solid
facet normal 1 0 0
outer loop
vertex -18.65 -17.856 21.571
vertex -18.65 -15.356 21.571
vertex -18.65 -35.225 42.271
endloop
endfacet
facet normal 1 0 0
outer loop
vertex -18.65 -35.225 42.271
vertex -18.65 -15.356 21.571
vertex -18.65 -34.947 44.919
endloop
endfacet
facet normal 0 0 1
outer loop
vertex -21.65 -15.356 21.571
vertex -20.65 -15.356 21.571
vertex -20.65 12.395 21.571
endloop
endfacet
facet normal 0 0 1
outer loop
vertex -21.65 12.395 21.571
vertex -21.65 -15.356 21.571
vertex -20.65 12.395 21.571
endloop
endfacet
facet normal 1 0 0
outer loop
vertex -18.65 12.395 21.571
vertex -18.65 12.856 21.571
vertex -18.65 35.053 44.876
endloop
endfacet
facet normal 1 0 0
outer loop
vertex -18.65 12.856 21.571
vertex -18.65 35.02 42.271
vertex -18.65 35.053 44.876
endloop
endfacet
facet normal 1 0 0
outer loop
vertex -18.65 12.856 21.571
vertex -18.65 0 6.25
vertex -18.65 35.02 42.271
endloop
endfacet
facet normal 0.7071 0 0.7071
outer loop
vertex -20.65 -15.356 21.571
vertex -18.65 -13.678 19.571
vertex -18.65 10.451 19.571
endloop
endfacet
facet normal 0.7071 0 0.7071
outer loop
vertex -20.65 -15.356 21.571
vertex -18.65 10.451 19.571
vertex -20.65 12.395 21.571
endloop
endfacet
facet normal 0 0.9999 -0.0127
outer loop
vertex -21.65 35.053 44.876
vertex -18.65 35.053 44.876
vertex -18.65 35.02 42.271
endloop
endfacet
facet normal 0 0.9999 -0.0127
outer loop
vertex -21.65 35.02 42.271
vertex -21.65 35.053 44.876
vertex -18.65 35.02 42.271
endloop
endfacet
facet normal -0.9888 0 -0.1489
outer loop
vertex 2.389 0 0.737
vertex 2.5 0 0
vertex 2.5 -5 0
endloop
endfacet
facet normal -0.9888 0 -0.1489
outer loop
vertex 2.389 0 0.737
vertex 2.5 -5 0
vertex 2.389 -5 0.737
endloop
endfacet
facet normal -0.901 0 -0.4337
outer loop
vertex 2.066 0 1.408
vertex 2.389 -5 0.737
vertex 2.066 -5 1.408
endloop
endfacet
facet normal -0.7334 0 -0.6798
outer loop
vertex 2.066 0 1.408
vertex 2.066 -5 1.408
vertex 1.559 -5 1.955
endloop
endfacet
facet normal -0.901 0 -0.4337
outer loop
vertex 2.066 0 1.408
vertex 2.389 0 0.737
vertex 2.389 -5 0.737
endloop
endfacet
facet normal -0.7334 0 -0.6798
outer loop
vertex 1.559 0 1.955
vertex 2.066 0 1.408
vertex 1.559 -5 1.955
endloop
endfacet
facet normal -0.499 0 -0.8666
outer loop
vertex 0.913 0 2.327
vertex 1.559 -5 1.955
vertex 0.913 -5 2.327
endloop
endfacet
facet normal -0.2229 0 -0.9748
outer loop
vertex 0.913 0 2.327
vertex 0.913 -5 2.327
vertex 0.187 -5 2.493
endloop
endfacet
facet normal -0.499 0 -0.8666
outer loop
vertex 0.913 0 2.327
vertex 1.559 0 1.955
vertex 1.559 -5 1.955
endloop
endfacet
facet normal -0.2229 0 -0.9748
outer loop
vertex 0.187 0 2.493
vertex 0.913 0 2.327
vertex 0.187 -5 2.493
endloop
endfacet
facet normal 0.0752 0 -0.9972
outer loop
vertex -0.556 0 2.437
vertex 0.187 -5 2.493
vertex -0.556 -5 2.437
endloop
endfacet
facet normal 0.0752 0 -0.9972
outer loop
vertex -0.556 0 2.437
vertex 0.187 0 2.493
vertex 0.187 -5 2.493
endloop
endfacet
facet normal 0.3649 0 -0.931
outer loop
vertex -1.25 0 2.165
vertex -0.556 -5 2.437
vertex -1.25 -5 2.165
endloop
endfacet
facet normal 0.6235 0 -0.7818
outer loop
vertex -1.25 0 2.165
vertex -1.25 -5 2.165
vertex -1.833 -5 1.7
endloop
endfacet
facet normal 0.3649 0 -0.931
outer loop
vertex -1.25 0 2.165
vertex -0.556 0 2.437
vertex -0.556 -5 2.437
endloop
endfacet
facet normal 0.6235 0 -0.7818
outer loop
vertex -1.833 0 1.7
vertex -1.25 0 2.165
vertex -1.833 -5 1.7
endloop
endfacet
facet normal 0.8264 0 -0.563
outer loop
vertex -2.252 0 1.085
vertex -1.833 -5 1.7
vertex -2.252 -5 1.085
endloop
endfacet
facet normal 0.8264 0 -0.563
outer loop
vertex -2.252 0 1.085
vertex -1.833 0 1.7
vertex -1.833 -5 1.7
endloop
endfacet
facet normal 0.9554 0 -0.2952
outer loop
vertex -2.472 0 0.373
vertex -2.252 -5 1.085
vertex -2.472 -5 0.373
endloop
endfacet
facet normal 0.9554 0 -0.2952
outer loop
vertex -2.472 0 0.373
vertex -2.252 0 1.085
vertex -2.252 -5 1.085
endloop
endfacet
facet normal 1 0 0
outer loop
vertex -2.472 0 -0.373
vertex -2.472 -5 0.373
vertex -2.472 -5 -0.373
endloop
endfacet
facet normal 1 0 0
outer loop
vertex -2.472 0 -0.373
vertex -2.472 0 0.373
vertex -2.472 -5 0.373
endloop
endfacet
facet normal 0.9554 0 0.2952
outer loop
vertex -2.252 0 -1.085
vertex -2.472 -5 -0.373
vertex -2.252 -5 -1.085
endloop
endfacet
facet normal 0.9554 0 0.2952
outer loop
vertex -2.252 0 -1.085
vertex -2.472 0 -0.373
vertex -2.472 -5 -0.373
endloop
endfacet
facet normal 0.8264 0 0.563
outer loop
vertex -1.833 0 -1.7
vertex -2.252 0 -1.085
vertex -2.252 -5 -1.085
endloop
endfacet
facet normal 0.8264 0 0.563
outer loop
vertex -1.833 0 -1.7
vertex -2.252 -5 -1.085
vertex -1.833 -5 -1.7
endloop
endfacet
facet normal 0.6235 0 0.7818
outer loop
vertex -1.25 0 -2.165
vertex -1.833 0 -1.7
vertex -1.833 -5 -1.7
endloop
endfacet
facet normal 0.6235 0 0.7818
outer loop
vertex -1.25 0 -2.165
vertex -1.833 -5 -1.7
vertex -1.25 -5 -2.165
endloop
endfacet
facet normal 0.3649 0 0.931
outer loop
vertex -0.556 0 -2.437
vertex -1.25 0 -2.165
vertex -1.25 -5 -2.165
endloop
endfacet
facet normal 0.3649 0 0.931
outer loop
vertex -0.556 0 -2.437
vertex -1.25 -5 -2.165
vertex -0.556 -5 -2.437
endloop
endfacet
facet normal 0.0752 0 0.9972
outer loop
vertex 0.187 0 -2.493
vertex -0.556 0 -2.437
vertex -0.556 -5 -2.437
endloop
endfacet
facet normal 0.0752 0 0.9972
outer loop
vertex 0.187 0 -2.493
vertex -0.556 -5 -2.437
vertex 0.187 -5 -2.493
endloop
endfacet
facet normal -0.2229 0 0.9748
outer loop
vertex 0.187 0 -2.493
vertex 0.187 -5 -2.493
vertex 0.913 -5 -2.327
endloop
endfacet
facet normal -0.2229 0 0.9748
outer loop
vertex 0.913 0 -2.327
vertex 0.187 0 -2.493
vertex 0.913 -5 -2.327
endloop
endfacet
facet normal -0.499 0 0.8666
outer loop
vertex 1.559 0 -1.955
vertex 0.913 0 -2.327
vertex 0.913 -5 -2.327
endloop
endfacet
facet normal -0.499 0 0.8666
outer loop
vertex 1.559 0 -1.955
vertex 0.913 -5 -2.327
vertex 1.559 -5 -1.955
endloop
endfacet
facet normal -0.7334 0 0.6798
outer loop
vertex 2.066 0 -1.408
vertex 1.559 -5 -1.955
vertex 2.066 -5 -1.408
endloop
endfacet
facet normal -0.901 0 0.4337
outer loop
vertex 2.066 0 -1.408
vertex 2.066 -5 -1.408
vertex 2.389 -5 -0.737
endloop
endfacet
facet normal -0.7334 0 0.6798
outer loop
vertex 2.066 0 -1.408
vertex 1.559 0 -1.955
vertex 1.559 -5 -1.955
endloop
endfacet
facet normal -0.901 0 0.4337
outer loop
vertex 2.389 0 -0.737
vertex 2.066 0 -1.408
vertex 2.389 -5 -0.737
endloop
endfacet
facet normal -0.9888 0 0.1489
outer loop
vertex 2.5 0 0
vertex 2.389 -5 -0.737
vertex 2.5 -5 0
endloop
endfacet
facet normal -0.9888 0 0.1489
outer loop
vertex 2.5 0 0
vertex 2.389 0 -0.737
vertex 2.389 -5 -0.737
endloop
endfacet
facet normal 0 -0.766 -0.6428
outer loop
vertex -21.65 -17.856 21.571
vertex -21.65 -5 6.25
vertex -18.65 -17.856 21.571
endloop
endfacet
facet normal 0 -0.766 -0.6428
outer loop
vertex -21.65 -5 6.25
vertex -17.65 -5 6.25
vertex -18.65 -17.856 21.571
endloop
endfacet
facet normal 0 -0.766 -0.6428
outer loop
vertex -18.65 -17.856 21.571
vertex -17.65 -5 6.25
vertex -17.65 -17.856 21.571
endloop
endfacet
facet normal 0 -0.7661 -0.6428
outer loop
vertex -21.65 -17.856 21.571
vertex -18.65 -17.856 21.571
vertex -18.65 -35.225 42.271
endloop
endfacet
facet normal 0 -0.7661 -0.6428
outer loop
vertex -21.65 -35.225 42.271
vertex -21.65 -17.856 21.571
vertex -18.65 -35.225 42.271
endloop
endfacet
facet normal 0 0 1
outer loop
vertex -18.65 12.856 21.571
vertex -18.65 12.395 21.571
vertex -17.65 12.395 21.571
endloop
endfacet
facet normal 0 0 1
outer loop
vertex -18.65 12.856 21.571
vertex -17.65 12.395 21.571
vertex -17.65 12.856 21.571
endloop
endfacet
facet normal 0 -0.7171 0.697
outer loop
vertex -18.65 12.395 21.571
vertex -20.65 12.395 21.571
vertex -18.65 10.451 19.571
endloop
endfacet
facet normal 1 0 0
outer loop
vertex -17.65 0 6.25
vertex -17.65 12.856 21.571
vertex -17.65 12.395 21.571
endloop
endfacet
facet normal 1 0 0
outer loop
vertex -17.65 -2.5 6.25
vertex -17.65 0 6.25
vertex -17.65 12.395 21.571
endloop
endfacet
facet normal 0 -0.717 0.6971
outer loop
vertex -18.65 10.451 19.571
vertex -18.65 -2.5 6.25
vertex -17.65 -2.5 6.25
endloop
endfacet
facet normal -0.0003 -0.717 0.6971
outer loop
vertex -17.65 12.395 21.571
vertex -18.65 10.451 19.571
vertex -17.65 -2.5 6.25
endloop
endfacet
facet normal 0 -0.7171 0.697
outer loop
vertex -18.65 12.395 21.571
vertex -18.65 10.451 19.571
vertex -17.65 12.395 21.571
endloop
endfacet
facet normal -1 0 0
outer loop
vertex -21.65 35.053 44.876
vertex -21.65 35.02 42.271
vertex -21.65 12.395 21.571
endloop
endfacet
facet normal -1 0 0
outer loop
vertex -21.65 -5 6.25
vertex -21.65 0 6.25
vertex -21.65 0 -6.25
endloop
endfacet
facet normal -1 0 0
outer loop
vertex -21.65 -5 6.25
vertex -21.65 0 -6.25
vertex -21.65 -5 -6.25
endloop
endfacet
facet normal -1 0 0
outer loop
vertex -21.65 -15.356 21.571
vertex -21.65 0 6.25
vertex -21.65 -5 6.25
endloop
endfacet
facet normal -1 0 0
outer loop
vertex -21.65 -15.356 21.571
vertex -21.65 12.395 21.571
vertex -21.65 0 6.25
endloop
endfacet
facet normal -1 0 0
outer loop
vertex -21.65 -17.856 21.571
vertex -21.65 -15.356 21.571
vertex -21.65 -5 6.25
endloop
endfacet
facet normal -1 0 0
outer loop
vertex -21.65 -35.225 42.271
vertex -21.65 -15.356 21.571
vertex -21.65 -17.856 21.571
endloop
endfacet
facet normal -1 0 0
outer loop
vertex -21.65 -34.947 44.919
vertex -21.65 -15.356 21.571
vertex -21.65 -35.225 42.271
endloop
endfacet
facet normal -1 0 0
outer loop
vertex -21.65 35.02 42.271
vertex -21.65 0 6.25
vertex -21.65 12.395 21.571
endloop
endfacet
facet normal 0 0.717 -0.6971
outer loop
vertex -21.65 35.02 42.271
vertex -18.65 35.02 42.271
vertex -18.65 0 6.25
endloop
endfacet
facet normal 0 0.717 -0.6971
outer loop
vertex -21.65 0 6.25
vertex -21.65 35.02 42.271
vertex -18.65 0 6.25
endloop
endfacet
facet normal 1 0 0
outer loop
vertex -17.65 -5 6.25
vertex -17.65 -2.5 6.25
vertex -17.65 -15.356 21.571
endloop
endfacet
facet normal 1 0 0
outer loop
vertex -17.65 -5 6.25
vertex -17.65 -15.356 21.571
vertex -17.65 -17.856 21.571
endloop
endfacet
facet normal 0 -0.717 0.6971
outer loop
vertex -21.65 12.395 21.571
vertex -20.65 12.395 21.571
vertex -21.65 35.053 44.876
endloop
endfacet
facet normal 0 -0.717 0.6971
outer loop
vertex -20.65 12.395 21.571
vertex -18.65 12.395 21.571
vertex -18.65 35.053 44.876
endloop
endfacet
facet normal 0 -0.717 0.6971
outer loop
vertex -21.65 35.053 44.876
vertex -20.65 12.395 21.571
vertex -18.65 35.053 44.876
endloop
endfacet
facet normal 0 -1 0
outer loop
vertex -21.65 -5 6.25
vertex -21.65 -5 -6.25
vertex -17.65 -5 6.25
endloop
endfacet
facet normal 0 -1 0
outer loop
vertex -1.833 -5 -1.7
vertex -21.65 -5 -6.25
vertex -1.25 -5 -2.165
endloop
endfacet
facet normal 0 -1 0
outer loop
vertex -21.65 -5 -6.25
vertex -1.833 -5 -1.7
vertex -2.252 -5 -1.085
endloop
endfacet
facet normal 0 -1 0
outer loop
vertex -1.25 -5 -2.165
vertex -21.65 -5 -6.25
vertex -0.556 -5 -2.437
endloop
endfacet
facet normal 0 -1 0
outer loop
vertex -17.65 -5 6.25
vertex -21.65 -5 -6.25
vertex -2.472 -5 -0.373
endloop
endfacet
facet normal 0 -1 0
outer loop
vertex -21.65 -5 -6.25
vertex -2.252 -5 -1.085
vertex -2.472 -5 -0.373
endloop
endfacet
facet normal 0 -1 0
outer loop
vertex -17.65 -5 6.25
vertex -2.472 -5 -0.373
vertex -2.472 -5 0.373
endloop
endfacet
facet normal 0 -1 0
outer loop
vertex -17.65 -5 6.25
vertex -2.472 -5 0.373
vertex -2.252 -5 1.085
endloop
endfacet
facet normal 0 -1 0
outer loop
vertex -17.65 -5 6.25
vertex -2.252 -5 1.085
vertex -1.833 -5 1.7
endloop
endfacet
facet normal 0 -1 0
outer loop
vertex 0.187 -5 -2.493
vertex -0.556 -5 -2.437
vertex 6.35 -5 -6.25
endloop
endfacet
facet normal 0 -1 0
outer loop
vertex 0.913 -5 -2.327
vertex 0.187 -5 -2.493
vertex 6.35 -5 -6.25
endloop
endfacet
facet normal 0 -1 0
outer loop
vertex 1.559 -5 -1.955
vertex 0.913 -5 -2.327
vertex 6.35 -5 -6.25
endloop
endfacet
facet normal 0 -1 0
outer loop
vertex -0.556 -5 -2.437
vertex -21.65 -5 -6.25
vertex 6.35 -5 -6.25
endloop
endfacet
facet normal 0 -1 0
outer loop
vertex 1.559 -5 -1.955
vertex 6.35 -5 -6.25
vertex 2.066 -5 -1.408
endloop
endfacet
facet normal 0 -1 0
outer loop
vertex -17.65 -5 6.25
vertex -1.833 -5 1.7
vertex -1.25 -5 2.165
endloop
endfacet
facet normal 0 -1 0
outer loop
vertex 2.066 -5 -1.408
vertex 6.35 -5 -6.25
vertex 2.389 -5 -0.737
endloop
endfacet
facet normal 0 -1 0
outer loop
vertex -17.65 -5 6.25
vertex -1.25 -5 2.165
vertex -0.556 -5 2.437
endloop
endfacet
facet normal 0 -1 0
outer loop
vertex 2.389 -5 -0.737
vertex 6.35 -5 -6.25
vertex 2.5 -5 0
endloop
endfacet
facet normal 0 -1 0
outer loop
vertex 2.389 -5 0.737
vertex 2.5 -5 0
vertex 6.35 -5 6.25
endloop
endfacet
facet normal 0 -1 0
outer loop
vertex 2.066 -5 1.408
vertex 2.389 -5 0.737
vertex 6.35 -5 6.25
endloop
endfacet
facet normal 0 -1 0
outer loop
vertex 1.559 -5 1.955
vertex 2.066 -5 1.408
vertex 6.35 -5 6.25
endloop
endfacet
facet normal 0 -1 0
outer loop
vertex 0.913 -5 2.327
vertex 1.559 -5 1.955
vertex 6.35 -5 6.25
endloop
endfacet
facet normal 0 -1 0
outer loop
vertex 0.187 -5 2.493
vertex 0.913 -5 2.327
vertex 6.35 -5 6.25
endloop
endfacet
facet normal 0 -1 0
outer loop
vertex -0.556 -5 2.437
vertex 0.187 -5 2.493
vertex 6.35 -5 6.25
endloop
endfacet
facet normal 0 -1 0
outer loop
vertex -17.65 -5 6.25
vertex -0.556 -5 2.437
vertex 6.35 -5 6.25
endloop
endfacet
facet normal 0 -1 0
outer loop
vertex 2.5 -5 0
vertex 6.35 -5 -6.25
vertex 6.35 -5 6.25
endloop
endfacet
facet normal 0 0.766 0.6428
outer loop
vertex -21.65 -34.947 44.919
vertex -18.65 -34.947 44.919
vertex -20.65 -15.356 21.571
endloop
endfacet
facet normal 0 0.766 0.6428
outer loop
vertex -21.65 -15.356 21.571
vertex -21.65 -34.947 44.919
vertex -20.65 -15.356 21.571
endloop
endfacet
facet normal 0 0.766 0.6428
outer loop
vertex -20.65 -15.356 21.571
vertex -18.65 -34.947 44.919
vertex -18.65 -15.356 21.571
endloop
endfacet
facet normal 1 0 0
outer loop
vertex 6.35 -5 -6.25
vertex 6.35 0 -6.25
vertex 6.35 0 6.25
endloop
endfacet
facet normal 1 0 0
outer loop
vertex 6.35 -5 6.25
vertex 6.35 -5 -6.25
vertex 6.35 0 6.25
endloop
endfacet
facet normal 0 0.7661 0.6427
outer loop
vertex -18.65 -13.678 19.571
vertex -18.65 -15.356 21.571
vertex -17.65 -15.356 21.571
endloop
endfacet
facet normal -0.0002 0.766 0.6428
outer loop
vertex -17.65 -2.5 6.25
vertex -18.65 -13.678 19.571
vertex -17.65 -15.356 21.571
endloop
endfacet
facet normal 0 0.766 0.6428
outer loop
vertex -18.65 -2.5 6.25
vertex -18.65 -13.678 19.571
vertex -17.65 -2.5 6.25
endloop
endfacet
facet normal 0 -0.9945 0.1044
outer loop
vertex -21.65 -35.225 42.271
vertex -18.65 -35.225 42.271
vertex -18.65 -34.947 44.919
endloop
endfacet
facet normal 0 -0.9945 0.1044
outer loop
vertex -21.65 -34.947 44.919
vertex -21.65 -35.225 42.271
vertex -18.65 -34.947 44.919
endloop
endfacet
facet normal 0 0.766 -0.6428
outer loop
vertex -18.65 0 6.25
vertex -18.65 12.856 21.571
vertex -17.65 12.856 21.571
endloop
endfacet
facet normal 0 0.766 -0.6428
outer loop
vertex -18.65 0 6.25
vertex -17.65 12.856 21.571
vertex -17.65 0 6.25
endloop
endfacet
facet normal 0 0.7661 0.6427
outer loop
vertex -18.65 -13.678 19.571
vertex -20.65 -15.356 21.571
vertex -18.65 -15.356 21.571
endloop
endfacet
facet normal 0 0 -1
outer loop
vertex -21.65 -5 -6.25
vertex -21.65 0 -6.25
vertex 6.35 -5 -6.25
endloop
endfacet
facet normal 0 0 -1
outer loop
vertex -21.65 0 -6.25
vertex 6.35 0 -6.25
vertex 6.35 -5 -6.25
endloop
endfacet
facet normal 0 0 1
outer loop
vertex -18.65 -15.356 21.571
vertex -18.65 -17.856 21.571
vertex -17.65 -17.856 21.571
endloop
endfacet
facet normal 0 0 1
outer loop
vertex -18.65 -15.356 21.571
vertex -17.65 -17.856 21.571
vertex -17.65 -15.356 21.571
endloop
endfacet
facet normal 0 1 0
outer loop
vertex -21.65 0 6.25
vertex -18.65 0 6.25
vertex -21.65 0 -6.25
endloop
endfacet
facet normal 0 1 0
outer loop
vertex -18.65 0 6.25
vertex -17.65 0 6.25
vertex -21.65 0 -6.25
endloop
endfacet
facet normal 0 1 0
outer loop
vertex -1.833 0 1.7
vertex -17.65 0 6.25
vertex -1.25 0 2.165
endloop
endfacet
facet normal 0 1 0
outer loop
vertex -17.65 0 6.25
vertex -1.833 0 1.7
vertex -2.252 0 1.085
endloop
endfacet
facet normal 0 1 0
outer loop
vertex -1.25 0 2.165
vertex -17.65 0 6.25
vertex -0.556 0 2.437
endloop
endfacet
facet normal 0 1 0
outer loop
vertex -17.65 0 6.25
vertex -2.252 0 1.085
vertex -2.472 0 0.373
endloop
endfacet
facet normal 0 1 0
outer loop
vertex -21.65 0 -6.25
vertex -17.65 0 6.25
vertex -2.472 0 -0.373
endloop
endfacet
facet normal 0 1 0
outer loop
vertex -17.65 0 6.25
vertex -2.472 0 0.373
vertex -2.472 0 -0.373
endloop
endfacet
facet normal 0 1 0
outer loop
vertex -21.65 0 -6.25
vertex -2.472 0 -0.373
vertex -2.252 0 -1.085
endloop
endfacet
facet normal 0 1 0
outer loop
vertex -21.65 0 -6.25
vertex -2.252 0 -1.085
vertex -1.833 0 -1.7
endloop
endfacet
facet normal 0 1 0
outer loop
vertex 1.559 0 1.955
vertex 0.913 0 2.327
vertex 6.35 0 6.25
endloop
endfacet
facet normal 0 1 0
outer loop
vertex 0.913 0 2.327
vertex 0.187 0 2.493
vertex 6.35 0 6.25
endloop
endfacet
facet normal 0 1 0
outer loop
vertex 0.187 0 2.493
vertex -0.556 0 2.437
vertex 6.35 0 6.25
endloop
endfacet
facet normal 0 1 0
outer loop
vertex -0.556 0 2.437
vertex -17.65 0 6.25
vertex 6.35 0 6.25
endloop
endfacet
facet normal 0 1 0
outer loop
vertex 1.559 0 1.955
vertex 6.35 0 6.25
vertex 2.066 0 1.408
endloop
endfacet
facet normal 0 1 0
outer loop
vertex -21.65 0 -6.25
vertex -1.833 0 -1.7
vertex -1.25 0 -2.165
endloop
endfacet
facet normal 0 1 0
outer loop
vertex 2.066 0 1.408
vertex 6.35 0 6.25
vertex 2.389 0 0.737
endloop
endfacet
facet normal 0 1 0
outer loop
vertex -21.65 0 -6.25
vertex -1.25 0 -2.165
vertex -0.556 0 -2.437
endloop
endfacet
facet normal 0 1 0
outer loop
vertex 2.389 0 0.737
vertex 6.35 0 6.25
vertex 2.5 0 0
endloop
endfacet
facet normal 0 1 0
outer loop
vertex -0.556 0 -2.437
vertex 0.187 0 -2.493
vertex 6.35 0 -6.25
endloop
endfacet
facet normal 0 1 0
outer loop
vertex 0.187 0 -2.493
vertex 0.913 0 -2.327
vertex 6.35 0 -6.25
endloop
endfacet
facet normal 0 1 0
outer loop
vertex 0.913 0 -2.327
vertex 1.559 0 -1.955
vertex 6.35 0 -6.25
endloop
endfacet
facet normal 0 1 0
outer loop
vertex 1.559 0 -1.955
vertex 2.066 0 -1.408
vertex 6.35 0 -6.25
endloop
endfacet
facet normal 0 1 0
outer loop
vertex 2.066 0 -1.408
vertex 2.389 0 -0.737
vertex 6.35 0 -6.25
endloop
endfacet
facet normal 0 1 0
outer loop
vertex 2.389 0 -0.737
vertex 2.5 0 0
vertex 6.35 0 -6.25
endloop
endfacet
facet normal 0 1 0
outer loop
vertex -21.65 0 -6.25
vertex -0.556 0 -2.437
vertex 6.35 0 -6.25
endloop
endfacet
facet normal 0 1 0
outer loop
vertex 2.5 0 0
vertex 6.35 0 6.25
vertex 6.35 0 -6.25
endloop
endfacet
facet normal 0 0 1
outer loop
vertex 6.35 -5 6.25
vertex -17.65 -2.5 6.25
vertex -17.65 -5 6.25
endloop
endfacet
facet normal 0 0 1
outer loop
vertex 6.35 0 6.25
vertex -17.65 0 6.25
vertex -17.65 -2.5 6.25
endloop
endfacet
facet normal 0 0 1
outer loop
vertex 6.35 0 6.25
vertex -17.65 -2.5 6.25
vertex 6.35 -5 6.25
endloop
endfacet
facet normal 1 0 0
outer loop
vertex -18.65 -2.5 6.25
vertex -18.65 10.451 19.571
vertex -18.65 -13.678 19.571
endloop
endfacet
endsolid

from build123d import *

# Parameters (mm, degrees)
F0_W        = 25
F0_H        = 12.5
F0_R        = 2.5
F1_DEPTH    = 5
F3_DEPTH    = 1
F4_DEPTH    = 3
F5_T4_DEPTH = 38.037750089


# Not quite as in the source:
# - a fillet or chamfer that OpenCascade refuses, or shapes differently, is made with other operations: its cross-section is extruded or revolved along the edge and cut away or added


with BuildPart() as f1:
    # F0 (on Front) → F1 (new body)
    with BuildSketch(Plane.XZ):
        with Locations((-6.15, 0)):
            Rectangle(F0_W, F0_H)
        Circle(F0_R, mode=Mode.SUBTRACT)
    extrude(amount=F1_DEPTH)

    # F2 (on face) → F3 (join)
    with BuildSketch(Plane(origin=(-18.65, 0, 0), x_dir=(0, -1, 0), z_dir=(-1, 0, 0))):
        Polygon((0, 6.25), (0, -6.25), (5, -6.25), (5, 6.25), (2.5, 6.25), align=None)
        Polygon((-12.8557521937, 21.5708888624), (0, 6.25), (2.5, 6.25), (-12.3952659434, 21.5708888624), align=None)
        Polygon((2.5, 6.25), (5, 6.25), (17.8557521937, 21.5708888624), (15.3557521937, 21.5708888624), align=None)
    extrude(amount=-F3_DEPTH)

    # F2 (on face) → F4 (join)
    with BuildSketch(Plane(origin=(-18.65, 0, 0), x_dir=(0, -1, 0), z_dir=(-1, 0, 0))):
        Polygon((0, 6.25), (0, -6.25), (5, -6.25), (5, 6.25), (2.5, 6.25), align=None)
        Polygon((-12.8557521937, 21.5708888624), (0, 6.25), (2.5, 6.25), (-12.3952659434, 21.5708888624), align=None)
        Polygon((-35.0204582804, 42.2711459978), (0, 6.25), (-12.8557521937, 21.5708888624), (-12.3952659434, 21.5708888624), (-35.0532565039, 44.8763173483), align=None)
        Polygon((2.5, 6.25), (5, 6.25), (17.8557521937, 21.5708888624), (15.3557521937, 21.5708888624), align=None)
        Polygon((-12.3952659434, 21.5708888624), (2.5, 6.25), (15.3557521937, 21.5708888624), align=None)
        Polygon((15.3557521937, 21.5708888624), (17.8557521937, 21.5708888624), (35.2253303214, 42.2711459978), (34.9467307814, 44.9185079767), align=None)
    extrude(amount=F4_DEPTH)

    # F5: chamfer of 2 on 1 edges, made by hand


with BuildPart() as f5_tool2:
    # F5_s3 → F5_t4 (new body)
    with BuildSketch(Plane.XZ.offset(20.4991181697)):
        Polygon((-18.65, 19.5708888624), (-20.65, 21.5708888624), (-18.65, 21.5708888624), align=None)
    extrude(amount=-F5_T4_DEPTH)

    split(bisect_by=Plane(origin=(0, -4.4089680227, 4.2864844086), x_dir=(1, 0, 0), z_dir=(0, -0.7169959169, 0.6970773667)), keep=Keep.TOP)

    split(bisect_by=Plane(origin=(0, 1.6104640061, 1.3513397535), x_dir=(1, 0, 0), z_dir=(0, 0.7660444431, 0.6427876097)), keep=Keep.TOP)


with BuildPart() as f1_1:
    add(f1.part)

    # F5_t1: cut F5_tool2
    add(f5_tool2.part, mode=Mode.SUBTRACT)


solid = f1_1.part
